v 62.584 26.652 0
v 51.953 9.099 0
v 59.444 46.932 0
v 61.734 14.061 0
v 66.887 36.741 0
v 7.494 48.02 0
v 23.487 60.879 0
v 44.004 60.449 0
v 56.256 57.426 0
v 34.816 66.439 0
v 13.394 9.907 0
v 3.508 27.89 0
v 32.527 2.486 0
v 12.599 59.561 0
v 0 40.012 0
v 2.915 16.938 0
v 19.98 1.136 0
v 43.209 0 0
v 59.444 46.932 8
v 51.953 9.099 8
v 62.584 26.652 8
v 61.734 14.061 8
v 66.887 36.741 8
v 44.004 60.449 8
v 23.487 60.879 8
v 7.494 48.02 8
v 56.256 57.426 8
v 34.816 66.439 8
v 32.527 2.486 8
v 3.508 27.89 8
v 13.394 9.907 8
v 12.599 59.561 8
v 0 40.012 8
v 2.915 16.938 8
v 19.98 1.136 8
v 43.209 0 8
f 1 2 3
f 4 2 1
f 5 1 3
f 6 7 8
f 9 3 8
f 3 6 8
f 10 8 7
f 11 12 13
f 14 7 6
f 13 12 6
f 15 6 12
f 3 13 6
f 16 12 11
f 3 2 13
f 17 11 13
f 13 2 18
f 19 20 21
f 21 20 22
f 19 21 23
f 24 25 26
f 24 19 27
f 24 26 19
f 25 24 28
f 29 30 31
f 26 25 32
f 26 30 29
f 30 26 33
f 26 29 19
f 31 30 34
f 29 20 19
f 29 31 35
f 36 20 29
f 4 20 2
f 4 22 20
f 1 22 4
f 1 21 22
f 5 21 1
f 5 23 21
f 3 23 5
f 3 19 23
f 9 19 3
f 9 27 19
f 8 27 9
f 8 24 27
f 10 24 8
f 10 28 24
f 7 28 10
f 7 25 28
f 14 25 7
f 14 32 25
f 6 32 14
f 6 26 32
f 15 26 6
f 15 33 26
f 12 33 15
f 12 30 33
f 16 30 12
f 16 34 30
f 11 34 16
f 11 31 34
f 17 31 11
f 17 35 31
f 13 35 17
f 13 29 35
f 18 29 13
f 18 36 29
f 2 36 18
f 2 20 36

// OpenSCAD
$fn = 32;

// ----------------------------------------------------------------------
// Chain sprocket: 9 teeth, 30 mm root radius
// ----------------------------------------------------------------------

// --- parameters (mm) ---
profile_height = 8;       // extrusion height
profile_points = 18;      // points of the closed outline

profile = [[62.584, 26.652], [66.887, 36.741], [59.444, 46.932], [56.256, 57.426], [44.004, 60.449], [34.816, 66.439], [23.487, 60.879], [12.599, 59.561], [7.494, 48.02], [0, 40.012], [3.508, 27.89], [2.915, 16.938], [13.394, 9.907], [19.98, 1.136], [32.527, 2.486], [43.209, 0], [51.953, 9.099], [61.734, 14.061]];  // single closed polygon, 18 points, counter clockwise

// --- the one profile operation ---
linear_extrude(height = profile_height) polygon(points = profile);
